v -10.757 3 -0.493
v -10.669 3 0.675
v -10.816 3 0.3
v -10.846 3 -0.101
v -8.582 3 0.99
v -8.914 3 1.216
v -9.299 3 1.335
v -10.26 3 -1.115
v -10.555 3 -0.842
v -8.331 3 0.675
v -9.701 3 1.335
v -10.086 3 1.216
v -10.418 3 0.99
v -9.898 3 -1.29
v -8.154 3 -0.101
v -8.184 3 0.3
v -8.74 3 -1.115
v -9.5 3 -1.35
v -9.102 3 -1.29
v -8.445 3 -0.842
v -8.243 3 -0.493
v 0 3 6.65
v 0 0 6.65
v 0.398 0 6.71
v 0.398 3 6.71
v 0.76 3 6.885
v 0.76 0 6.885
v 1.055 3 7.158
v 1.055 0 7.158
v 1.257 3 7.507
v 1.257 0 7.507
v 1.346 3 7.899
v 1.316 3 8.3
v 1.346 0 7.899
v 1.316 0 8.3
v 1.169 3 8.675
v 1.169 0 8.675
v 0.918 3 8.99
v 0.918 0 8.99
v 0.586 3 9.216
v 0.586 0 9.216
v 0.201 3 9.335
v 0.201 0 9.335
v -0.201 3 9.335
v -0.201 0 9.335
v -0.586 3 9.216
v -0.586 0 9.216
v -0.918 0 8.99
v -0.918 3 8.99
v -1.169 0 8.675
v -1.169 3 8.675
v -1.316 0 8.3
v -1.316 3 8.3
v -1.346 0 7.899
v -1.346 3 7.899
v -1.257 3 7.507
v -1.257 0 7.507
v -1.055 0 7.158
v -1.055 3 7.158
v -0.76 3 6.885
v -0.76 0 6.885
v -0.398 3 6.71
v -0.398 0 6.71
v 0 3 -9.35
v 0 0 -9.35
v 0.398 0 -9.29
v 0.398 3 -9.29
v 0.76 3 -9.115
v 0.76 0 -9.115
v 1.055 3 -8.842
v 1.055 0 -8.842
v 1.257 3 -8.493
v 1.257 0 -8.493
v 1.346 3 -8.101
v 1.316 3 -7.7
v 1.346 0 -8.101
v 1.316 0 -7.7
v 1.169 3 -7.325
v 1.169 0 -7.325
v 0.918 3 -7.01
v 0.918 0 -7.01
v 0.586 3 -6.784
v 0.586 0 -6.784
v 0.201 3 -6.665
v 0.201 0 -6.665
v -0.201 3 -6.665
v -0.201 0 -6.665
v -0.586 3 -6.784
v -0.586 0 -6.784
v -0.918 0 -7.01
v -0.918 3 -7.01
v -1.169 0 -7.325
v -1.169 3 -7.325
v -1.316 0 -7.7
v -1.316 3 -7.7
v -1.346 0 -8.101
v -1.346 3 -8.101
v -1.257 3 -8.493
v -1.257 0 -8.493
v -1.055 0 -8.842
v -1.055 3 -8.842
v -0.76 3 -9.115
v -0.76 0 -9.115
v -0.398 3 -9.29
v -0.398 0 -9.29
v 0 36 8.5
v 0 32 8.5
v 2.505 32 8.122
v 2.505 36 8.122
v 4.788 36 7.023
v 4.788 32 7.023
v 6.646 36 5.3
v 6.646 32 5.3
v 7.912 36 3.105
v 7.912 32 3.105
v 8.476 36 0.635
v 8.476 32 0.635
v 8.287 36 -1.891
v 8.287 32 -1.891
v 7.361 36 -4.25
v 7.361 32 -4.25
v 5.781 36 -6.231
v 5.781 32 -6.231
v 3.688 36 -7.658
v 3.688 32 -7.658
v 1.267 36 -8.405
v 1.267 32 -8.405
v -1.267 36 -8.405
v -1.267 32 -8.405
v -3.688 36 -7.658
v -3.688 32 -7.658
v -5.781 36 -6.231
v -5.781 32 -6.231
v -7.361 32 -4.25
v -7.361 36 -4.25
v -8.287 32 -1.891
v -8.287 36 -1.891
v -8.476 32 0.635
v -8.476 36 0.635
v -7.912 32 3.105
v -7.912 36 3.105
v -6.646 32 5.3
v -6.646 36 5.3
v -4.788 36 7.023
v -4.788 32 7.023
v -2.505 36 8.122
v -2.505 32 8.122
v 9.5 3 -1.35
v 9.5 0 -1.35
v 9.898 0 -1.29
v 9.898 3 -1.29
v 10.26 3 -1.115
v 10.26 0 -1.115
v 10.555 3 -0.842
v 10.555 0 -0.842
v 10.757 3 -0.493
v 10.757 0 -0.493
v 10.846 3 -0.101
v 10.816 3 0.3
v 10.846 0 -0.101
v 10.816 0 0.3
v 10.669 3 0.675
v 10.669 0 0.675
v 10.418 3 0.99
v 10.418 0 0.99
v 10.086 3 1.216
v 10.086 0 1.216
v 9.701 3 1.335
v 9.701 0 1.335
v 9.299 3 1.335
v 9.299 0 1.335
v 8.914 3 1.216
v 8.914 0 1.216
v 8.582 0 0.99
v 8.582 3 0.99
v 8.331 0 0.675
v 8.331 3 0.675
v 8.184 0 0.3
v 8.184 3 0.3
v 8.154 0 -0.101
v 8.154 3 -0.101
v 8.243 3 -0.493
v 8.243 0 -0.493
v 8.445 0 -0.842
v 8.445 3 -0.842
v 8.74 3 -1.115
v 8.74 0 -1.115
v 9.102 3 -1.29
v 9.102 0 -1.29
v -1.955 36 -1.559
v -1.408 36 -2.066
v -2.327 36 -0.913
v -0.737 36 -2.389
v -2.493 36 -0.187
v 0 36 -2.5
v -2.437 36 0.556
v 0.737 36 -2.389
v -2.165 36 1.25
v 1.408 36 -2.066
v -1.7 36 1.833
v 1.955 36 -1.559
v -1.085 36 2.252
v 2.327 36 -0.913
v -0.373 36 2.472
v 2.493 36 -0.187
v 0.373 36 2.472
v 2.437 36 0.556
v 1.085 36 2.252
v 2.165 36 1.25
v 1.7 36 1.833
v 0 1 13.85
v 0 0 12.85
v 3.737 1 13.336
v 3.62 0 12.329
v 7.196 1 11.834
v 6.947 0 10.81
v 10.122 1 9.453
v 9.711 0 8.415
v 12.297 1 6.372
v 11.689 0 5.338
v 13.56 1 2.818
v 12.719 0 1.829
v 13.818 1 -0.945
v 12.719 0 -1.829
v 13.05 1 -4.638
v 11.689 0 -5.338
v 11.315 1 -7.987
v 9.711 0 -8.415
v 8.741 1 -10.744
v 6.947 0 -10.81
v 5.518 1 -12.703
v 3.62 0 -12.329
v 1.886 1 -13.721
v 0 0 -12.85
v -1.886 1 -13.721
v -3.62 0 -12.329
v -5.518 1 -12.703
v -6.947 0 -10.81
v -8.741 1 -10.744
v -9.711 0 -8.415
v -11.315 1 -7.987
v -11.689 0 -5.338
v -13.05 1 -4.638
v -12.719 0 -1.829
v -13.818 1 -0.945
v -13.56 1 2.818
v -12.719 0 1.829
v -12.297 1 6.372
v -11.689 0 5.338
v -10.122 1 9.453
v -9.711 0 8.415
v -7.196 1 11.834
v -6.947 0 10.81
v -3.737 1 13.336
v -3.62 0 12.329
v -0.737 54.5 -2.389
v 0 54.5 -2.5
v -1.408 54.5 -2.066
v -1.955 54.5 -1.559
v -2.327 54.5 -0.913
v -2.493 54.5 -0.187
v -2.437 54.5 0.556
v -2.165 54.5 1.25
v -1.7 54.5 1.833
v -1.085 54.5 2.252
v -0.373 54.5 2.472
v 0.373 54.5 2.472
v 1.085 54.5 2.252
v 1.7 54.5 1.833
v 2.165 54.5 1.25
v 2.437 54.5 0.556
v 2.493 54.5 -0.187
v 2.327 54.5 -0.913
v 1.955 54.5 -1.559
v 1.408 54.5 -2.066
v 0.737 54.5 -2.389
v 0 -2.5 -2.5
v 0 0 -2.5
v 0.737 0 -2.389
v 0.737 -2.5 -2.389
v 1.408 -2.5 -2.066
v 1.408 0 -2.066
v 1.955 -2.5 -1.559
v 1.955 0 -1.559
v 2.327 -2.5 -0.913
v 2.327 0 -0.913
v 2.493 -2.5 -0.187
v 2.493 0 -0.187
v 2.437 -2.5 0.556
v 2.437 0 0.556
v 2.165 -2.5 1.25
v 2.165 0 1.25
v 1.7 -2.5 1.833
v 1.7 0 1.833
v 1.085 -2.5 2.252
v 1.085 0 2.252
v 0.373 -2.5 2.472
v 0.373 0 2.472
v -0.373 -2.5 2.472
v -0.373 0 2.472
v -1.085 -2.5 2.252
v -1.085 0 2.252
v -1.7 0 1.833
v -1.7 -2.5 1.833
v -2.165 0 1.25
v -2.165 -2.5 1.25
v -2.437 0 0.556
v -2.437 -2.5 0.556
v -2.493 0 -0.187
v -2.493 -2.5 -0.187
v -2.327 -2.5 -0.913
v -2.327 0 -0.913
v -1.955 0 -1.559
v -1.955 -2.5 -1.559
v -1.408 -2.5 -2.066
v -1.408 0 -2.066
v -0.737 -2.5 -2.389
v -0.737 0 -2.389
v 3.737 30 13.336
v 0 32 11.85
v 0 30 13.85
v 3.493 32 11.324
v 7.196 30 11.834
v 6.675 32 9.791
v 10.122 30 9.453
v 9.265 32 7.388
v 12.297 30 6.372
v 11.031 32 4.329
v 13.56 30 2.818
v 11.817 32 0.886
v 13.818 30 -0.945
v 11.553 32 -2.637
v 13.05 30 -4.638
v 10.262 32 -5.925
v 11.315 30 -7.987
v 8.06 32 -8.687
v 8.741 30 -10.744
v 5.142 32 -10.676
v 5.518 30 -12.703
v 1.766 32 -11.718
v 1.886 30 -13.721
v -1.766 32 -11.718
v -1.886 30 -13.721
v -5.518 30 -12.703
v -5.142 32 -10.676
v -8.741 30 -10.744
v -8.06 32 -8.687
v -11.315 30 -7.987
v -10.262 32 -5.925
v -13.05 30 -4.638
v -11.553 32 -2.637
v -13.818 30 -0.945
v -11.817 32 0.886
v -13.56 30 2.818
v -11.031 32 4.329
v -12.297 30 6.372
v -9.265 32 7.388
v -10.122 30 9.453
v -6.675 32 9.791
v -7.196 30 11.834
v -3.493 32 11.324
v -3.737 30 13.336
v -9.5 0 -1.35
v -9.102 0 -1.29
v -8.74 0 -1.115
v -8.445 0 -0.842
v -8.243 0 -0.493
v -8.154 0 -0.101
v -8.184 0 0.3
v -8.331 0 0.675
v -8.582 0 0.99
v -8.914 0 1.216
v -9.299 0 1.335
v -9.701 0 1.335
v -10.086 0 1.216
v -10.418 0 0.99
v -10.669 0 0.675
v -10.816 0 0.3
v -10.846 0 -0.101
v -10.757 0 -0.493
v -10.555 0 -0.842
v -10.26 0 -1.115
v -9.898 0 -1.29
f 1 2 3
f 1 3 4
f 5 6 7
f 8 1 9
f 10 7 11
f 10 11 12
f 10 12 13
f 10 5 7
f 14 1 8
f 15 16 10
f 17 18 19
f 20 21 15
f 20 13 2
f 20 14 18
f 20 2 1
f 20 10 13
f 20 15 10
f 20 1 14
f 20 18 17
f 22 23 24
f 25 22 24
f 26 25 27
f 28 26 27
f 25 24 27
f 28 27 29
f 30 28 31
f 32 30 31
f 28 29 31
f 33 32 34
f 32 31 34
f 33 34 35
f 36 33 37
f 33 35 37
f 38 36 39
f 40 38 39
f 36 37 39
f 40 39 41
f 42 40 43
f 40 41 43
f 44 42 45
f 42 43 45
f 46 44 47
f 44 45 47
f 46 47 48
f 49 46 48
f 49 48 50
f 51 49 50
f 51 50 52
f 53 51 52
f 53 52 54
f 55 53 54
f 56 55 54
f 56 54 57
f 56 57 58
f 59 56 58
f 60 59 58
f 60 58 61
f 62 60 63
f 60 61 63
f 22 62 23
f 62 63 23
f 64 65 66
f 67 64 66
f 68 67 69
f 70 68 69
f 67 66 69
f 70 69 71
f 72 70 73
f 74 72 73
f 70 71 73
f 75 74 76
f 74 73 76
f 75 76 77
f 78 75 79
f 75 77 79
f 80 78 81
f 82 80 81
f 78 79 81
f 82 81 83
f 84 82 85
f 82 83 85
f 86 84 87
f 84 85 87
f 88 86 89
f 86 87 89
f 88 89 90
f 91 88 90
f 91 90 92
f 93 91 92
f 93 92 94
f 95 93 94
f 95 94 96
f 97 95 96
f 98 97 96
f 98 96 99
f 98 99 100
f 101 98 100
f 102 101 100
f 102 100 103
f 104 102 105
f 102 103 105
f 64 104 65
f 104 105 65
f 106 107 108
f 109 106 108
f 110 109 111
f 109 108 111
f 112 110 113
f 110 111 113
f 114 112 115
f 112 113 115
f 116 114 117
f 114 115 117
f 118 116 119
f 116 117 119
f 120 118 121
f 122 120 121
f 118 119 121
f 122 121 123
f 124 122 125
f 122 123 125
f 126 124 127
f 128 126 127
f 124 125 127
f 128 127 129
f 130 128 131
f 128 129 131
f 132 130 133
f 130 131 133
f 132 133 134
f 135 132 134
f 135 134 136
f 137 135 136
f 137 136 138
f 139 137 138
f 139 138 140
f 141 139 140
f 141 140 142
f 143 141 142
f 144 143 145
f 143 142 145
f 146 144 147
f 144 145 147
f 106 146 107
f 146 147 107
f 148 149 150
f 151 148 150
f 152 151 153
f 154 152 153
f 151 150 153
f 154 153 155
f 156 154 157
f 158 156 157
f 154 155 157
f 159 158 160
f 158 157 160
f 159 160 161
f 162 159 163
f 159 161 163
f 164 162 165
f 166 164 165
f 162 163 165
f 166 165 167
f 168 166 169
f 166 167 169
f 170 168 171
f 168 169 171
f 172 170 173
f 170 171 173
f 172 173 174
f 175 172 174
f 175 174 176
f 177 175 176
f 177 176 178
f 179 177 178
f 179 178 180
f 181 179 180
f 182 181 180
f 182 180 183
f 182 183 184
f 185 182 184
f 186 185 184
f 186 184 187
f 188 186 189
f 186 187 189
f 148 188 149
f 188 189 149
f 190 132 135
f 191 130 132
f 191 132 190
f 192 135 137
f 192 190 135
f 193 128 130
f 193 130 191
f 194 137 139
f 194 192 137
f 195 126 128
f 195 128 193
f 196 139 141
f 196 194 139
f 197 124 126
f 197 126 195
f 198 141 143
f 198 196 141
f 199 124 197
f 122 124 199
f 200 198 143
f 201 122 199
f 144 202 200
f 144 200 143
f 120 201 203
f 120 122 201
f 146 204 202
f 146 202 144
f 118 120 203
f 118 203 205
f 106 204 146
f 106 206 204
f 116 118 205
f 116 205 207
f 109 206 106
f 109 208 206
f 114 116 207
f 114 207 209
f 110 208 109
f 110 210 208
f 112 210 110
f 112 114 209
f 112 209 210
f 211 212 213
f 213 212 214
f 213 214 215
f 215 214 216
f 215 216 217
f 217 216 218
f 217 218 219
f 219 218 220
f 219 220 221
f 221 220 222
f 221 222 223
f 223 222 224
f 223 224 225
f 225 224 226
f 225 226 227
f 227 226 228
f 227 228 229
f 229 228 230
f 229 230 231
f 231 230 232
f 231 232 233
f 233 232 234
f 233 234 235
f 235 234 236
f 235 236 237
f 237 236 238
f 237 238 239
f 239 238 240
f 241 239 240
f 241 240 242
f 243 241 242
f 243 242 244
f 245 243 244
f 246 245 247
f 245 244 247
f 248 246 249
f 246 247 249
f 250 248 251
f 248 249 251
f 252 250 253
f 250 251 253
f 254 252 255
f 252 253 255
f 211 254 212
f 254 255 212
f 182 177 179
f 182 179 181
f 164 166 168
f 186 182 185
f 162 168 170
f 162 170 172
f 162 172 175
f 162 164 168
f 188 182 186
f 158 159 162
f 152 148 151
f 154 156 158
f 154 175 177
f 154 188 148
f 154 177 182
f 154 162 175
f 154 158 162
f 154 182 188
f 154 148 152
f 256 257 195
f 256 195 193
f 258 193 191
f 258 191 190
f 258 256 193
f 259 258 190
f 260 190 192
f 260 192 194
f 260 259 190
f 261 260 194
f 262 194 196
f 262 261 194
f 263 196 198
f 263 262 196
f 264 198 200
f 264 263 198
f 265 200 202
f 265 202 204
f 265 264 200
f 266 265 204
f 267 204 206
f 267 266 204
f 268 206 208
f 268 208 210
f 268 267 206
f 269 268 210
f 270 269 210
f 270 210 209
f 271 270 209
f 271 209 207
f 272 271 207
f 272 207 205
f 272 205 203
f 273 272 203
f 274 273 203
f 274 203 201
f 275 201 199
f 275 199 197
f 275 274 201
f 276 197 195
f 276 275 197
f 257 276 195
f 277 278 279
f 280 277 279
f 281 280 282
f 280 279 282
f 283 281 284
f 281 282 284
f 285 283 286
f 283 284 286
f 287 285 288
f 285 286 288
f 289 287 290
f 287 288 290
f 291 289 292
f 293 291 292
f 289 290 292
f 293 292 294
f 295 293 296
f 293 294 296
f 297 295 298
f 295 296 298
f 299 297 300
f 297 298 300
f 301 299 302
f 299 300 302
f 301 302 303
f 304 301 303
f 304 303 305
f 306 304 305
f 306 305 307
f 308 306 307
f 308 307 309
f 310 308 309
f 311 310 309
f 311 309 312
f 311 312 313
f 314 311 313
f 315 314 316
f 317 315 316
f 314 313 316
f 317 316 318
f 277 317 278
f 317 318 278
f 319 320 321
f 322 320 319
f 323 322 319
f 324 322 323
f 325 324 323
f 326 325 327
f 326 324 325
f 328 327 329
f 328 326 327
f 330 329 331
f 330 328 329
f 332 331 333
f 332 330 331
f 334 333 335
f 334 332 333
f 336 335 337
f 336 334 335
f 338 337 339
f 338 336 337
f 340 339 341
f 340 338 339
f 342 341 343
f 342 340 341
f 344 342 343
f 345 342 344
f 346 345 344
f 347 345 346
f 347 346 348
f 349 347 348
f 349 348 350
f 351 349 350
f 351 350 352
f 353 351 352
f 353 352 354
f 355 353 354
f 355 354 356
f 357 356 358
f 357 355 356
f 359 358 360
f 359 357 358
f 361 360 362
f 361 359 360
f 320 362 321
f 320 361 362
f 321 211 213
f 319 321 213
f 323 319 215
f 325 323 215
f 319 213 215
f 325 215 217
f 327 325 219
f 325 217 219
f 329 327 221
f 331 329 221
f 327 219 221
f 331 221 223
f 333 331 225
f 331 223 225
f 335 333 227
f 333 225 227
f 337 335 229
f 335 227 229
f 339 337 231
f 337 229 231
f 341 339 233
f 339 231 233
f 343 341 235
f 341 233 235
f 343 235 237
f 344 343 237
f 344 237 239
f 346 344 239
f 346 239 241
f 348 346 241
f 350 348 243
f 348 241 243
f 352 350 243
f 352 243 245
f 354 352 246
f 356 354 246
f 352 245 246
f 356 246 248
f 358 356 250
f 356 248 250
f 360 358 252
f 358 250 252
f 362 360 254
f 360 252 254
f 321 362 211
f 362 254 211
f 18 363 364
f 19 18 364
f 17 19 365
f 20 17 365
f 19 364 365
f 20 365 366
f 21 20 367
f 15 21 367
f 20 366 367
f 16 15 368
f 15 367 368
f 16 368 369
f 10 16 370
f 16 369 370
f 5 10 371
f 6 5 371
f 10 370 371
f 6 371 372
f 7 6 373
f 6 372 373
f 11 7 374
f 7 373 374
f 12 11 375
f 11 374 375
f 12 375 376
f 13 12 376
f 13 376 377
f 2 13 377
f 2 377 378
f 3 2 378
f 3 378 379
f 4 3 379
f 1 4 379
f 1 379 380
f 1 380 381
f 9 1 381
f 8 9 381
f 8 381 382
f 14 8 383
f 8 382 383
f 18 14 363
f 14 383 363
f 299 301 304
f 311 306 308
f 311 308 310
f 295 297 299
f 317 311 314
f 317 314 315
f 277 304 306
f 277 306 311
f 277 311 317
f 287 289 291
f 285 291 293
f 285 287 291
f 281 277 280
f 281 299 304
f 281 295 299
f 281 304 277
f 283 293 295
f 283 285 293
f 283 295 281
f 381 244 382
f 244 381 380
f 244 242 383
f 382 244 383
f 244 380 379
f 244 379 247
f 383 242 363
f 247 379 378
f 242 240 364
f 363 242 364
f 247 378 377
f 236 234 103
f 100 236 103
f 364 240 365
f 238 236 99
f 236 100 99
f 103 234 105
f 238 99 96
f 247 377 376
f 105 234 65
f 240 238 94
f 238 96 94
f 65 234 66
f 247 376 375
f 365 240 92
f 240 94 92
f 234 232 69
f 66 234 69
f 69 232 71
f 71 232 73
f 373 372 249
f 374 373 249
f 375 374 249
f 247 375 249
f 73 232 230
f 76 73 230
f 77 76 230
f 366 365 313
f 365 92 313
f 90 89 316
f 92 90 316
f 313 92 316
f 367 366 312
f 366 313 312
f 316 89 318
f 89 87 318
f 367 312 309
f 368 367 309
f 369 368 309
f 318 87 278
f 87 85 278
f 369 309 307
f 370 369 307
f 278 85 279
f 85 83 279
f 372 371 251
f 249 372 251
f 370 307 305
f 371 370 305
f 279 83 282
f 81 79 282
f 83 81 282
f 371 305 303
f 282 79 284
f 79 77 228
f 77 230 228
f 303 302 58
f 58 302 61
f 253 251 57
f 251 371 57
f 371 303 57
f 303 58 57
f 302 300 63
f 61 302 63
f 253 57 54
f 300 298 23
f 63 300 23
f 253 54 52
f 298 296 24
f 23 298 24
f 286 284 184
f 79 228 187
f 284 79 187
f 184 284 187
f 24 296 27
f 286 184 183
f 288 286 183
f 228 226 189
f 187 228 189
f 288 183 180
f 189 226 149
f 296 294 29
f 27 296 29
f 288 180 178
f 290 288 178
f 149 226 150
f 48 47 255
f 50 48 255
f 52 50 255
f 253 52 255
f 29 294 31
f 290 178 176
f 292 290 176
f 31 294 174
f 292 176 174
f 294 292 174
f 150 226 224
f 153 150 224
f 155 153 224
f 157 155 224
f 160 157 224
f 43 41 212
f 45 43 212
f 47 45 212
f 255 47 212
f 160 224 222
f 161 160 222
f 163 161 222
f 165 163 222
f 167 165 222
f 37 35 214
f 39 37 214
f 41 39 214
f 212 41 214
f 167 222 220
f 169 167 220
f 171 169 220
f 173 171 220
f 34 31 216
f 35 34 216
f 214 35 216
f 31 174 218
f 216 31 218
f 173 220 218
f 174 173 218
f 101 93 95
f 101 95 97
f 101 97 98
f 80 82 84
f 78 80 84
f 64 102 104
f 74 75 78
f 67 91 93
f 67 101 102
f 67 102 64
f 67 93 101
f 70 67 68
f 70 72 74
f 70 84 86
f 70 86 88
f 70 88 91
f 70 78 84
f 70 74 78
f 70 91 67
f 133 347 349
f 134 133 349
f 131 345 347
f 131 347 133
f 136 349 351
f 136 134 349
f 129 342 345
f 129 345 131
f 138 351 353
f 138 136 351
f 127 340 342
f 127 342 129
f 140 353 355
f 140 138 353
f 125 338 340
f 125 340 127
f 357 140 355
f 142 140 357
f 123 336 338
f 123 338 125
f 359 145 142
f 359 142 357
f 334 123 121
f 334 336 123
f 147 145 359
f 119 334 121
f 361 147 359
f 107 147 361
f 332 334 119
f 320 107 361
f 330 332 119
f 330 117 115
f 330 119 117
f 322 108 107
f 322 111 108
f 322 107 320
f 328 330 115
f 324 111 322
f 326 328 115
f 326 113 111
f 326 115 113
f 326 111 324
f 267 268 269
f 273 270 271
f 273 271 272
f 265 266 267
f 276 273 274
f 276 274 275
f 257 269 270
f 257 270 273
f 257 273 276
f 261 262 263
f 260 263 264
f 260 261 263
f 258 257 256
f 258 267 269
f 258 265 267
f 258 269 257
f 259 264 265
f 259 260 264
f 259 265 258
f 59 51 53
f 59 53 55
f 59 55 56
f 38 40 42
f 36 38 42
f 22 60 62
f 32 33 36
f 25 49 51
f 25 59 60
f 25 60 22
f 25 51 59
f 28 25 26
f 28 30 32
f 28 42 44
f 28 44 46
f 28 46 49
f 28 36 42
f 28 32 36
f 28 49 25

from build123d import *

# Parameters (mm, degrees)
SKETCH_1_R          = 13.85
EXTRUDE_1_DEPTH     = 32
SKETCH_2_R          = 2.5
EXTRUDE_2_DEPTH     = 2.5
SKETCH_3_R          = 8.5
EXTRUDE_3_DEPTH     = 4
EXTRUDE_START       = 18.5
SKETCH_4_R          = 2.5
EXTRUDE_4_DEPTH     = 18.5
CHAMFER_1_SIZE      = 2
CHAMFER_2_SIZE      = 1
SKETCH_5_R          = 1.35
CUT_EXTRUDE_1_DEPTH = 3


with BuildPart() as part:
    # 草图1 → 凸台-拉伸1 (new body)
    with BuildSketch(Plane(origin=(0, 0, 0), x_dir=(1, 0, 0), z_dir=(0, 1, 0))):
        with Locations(Location((0, 0, 0), (0, 0, 270))):
            Circle(SKETCH_1_R)
    extrude(amount=EXTRUDE_1_DEPTH)

    # 草图2 → 凸台-拉伸2 (add)
    with BuildSketch(Plane.XZ):
        with Locations(Location((0, 0, 0), (0, 0, 270))):
            Circle(SKETCH_2_R)
    extrude(amount=EXTRUDE_2_DEPTH)

    # 草图3 → 凸台-拉伸3 (add)
    with BuildSketch(Plane(origin=(0, 32, 0), x_dir=(1, 0, 0), z_dir=(0, 1, 0))):
        with Locations(Location((0, 0, 0), (0, 0, 270))):
            Circle(SKETCH_3_R)
    extrude(amount=EXTRUDE_3_DEPTH)

    # 草图4 → 凸台-拉伸4 (add)
    with BuildSketch(Plane(origin=(0, 36, 0), x_dir=(1, 0, 0), z_dir=(0, 1, 0)).offset(EXTRUDE_START)):
        with Locations(Location((0, 0, 0), (0, 0, 90))):
            Circle(SKETCH_4_R)
    extrude(amount=-EXTRUDE_4_DEPTH)

    # 倒角1
    chamfer_1_edges = [part.edges().sort_by_distance(p)[0] for p in [
        (0, 32, -13.85),
    ]]
    chamfer(chamfer_1_edges, length=CHAMFER_1_SIZE)

    # 倒角2
    chamfer_2_edges = [part.edges().sort_by_distance(p)[0] for p in [
        (0, 0, -13.85),
    ]]
    chamfer(chamfer_2_edges, length=CHAMFER_2_SIZE)

    # 草图5 → 切除-拉伸1 (cut)
    with BuildSketch(Plane.XZ):
        with Locations(Location((0, 8, 0), (0, 0, 270))):
            Circle(SKETCH_5_R)
        with Locations(Location((-9.5, 0, 0), (0, 0, 270))):
            Circle(SKETCH_5_R)
        with Locations(Location((0, -8, 0), (0, 0, 270))):
            Circle(SKETCH_5_R)
        with Locations(Location((9.5, 0, 0), (0, 0, 270))):
            Circle(SKETCH_5_R)
    extrude(amount=-CUT_EXTRUDE_1_DEPTH, mode=Mode.SUBTRACT)


solid = part.part
